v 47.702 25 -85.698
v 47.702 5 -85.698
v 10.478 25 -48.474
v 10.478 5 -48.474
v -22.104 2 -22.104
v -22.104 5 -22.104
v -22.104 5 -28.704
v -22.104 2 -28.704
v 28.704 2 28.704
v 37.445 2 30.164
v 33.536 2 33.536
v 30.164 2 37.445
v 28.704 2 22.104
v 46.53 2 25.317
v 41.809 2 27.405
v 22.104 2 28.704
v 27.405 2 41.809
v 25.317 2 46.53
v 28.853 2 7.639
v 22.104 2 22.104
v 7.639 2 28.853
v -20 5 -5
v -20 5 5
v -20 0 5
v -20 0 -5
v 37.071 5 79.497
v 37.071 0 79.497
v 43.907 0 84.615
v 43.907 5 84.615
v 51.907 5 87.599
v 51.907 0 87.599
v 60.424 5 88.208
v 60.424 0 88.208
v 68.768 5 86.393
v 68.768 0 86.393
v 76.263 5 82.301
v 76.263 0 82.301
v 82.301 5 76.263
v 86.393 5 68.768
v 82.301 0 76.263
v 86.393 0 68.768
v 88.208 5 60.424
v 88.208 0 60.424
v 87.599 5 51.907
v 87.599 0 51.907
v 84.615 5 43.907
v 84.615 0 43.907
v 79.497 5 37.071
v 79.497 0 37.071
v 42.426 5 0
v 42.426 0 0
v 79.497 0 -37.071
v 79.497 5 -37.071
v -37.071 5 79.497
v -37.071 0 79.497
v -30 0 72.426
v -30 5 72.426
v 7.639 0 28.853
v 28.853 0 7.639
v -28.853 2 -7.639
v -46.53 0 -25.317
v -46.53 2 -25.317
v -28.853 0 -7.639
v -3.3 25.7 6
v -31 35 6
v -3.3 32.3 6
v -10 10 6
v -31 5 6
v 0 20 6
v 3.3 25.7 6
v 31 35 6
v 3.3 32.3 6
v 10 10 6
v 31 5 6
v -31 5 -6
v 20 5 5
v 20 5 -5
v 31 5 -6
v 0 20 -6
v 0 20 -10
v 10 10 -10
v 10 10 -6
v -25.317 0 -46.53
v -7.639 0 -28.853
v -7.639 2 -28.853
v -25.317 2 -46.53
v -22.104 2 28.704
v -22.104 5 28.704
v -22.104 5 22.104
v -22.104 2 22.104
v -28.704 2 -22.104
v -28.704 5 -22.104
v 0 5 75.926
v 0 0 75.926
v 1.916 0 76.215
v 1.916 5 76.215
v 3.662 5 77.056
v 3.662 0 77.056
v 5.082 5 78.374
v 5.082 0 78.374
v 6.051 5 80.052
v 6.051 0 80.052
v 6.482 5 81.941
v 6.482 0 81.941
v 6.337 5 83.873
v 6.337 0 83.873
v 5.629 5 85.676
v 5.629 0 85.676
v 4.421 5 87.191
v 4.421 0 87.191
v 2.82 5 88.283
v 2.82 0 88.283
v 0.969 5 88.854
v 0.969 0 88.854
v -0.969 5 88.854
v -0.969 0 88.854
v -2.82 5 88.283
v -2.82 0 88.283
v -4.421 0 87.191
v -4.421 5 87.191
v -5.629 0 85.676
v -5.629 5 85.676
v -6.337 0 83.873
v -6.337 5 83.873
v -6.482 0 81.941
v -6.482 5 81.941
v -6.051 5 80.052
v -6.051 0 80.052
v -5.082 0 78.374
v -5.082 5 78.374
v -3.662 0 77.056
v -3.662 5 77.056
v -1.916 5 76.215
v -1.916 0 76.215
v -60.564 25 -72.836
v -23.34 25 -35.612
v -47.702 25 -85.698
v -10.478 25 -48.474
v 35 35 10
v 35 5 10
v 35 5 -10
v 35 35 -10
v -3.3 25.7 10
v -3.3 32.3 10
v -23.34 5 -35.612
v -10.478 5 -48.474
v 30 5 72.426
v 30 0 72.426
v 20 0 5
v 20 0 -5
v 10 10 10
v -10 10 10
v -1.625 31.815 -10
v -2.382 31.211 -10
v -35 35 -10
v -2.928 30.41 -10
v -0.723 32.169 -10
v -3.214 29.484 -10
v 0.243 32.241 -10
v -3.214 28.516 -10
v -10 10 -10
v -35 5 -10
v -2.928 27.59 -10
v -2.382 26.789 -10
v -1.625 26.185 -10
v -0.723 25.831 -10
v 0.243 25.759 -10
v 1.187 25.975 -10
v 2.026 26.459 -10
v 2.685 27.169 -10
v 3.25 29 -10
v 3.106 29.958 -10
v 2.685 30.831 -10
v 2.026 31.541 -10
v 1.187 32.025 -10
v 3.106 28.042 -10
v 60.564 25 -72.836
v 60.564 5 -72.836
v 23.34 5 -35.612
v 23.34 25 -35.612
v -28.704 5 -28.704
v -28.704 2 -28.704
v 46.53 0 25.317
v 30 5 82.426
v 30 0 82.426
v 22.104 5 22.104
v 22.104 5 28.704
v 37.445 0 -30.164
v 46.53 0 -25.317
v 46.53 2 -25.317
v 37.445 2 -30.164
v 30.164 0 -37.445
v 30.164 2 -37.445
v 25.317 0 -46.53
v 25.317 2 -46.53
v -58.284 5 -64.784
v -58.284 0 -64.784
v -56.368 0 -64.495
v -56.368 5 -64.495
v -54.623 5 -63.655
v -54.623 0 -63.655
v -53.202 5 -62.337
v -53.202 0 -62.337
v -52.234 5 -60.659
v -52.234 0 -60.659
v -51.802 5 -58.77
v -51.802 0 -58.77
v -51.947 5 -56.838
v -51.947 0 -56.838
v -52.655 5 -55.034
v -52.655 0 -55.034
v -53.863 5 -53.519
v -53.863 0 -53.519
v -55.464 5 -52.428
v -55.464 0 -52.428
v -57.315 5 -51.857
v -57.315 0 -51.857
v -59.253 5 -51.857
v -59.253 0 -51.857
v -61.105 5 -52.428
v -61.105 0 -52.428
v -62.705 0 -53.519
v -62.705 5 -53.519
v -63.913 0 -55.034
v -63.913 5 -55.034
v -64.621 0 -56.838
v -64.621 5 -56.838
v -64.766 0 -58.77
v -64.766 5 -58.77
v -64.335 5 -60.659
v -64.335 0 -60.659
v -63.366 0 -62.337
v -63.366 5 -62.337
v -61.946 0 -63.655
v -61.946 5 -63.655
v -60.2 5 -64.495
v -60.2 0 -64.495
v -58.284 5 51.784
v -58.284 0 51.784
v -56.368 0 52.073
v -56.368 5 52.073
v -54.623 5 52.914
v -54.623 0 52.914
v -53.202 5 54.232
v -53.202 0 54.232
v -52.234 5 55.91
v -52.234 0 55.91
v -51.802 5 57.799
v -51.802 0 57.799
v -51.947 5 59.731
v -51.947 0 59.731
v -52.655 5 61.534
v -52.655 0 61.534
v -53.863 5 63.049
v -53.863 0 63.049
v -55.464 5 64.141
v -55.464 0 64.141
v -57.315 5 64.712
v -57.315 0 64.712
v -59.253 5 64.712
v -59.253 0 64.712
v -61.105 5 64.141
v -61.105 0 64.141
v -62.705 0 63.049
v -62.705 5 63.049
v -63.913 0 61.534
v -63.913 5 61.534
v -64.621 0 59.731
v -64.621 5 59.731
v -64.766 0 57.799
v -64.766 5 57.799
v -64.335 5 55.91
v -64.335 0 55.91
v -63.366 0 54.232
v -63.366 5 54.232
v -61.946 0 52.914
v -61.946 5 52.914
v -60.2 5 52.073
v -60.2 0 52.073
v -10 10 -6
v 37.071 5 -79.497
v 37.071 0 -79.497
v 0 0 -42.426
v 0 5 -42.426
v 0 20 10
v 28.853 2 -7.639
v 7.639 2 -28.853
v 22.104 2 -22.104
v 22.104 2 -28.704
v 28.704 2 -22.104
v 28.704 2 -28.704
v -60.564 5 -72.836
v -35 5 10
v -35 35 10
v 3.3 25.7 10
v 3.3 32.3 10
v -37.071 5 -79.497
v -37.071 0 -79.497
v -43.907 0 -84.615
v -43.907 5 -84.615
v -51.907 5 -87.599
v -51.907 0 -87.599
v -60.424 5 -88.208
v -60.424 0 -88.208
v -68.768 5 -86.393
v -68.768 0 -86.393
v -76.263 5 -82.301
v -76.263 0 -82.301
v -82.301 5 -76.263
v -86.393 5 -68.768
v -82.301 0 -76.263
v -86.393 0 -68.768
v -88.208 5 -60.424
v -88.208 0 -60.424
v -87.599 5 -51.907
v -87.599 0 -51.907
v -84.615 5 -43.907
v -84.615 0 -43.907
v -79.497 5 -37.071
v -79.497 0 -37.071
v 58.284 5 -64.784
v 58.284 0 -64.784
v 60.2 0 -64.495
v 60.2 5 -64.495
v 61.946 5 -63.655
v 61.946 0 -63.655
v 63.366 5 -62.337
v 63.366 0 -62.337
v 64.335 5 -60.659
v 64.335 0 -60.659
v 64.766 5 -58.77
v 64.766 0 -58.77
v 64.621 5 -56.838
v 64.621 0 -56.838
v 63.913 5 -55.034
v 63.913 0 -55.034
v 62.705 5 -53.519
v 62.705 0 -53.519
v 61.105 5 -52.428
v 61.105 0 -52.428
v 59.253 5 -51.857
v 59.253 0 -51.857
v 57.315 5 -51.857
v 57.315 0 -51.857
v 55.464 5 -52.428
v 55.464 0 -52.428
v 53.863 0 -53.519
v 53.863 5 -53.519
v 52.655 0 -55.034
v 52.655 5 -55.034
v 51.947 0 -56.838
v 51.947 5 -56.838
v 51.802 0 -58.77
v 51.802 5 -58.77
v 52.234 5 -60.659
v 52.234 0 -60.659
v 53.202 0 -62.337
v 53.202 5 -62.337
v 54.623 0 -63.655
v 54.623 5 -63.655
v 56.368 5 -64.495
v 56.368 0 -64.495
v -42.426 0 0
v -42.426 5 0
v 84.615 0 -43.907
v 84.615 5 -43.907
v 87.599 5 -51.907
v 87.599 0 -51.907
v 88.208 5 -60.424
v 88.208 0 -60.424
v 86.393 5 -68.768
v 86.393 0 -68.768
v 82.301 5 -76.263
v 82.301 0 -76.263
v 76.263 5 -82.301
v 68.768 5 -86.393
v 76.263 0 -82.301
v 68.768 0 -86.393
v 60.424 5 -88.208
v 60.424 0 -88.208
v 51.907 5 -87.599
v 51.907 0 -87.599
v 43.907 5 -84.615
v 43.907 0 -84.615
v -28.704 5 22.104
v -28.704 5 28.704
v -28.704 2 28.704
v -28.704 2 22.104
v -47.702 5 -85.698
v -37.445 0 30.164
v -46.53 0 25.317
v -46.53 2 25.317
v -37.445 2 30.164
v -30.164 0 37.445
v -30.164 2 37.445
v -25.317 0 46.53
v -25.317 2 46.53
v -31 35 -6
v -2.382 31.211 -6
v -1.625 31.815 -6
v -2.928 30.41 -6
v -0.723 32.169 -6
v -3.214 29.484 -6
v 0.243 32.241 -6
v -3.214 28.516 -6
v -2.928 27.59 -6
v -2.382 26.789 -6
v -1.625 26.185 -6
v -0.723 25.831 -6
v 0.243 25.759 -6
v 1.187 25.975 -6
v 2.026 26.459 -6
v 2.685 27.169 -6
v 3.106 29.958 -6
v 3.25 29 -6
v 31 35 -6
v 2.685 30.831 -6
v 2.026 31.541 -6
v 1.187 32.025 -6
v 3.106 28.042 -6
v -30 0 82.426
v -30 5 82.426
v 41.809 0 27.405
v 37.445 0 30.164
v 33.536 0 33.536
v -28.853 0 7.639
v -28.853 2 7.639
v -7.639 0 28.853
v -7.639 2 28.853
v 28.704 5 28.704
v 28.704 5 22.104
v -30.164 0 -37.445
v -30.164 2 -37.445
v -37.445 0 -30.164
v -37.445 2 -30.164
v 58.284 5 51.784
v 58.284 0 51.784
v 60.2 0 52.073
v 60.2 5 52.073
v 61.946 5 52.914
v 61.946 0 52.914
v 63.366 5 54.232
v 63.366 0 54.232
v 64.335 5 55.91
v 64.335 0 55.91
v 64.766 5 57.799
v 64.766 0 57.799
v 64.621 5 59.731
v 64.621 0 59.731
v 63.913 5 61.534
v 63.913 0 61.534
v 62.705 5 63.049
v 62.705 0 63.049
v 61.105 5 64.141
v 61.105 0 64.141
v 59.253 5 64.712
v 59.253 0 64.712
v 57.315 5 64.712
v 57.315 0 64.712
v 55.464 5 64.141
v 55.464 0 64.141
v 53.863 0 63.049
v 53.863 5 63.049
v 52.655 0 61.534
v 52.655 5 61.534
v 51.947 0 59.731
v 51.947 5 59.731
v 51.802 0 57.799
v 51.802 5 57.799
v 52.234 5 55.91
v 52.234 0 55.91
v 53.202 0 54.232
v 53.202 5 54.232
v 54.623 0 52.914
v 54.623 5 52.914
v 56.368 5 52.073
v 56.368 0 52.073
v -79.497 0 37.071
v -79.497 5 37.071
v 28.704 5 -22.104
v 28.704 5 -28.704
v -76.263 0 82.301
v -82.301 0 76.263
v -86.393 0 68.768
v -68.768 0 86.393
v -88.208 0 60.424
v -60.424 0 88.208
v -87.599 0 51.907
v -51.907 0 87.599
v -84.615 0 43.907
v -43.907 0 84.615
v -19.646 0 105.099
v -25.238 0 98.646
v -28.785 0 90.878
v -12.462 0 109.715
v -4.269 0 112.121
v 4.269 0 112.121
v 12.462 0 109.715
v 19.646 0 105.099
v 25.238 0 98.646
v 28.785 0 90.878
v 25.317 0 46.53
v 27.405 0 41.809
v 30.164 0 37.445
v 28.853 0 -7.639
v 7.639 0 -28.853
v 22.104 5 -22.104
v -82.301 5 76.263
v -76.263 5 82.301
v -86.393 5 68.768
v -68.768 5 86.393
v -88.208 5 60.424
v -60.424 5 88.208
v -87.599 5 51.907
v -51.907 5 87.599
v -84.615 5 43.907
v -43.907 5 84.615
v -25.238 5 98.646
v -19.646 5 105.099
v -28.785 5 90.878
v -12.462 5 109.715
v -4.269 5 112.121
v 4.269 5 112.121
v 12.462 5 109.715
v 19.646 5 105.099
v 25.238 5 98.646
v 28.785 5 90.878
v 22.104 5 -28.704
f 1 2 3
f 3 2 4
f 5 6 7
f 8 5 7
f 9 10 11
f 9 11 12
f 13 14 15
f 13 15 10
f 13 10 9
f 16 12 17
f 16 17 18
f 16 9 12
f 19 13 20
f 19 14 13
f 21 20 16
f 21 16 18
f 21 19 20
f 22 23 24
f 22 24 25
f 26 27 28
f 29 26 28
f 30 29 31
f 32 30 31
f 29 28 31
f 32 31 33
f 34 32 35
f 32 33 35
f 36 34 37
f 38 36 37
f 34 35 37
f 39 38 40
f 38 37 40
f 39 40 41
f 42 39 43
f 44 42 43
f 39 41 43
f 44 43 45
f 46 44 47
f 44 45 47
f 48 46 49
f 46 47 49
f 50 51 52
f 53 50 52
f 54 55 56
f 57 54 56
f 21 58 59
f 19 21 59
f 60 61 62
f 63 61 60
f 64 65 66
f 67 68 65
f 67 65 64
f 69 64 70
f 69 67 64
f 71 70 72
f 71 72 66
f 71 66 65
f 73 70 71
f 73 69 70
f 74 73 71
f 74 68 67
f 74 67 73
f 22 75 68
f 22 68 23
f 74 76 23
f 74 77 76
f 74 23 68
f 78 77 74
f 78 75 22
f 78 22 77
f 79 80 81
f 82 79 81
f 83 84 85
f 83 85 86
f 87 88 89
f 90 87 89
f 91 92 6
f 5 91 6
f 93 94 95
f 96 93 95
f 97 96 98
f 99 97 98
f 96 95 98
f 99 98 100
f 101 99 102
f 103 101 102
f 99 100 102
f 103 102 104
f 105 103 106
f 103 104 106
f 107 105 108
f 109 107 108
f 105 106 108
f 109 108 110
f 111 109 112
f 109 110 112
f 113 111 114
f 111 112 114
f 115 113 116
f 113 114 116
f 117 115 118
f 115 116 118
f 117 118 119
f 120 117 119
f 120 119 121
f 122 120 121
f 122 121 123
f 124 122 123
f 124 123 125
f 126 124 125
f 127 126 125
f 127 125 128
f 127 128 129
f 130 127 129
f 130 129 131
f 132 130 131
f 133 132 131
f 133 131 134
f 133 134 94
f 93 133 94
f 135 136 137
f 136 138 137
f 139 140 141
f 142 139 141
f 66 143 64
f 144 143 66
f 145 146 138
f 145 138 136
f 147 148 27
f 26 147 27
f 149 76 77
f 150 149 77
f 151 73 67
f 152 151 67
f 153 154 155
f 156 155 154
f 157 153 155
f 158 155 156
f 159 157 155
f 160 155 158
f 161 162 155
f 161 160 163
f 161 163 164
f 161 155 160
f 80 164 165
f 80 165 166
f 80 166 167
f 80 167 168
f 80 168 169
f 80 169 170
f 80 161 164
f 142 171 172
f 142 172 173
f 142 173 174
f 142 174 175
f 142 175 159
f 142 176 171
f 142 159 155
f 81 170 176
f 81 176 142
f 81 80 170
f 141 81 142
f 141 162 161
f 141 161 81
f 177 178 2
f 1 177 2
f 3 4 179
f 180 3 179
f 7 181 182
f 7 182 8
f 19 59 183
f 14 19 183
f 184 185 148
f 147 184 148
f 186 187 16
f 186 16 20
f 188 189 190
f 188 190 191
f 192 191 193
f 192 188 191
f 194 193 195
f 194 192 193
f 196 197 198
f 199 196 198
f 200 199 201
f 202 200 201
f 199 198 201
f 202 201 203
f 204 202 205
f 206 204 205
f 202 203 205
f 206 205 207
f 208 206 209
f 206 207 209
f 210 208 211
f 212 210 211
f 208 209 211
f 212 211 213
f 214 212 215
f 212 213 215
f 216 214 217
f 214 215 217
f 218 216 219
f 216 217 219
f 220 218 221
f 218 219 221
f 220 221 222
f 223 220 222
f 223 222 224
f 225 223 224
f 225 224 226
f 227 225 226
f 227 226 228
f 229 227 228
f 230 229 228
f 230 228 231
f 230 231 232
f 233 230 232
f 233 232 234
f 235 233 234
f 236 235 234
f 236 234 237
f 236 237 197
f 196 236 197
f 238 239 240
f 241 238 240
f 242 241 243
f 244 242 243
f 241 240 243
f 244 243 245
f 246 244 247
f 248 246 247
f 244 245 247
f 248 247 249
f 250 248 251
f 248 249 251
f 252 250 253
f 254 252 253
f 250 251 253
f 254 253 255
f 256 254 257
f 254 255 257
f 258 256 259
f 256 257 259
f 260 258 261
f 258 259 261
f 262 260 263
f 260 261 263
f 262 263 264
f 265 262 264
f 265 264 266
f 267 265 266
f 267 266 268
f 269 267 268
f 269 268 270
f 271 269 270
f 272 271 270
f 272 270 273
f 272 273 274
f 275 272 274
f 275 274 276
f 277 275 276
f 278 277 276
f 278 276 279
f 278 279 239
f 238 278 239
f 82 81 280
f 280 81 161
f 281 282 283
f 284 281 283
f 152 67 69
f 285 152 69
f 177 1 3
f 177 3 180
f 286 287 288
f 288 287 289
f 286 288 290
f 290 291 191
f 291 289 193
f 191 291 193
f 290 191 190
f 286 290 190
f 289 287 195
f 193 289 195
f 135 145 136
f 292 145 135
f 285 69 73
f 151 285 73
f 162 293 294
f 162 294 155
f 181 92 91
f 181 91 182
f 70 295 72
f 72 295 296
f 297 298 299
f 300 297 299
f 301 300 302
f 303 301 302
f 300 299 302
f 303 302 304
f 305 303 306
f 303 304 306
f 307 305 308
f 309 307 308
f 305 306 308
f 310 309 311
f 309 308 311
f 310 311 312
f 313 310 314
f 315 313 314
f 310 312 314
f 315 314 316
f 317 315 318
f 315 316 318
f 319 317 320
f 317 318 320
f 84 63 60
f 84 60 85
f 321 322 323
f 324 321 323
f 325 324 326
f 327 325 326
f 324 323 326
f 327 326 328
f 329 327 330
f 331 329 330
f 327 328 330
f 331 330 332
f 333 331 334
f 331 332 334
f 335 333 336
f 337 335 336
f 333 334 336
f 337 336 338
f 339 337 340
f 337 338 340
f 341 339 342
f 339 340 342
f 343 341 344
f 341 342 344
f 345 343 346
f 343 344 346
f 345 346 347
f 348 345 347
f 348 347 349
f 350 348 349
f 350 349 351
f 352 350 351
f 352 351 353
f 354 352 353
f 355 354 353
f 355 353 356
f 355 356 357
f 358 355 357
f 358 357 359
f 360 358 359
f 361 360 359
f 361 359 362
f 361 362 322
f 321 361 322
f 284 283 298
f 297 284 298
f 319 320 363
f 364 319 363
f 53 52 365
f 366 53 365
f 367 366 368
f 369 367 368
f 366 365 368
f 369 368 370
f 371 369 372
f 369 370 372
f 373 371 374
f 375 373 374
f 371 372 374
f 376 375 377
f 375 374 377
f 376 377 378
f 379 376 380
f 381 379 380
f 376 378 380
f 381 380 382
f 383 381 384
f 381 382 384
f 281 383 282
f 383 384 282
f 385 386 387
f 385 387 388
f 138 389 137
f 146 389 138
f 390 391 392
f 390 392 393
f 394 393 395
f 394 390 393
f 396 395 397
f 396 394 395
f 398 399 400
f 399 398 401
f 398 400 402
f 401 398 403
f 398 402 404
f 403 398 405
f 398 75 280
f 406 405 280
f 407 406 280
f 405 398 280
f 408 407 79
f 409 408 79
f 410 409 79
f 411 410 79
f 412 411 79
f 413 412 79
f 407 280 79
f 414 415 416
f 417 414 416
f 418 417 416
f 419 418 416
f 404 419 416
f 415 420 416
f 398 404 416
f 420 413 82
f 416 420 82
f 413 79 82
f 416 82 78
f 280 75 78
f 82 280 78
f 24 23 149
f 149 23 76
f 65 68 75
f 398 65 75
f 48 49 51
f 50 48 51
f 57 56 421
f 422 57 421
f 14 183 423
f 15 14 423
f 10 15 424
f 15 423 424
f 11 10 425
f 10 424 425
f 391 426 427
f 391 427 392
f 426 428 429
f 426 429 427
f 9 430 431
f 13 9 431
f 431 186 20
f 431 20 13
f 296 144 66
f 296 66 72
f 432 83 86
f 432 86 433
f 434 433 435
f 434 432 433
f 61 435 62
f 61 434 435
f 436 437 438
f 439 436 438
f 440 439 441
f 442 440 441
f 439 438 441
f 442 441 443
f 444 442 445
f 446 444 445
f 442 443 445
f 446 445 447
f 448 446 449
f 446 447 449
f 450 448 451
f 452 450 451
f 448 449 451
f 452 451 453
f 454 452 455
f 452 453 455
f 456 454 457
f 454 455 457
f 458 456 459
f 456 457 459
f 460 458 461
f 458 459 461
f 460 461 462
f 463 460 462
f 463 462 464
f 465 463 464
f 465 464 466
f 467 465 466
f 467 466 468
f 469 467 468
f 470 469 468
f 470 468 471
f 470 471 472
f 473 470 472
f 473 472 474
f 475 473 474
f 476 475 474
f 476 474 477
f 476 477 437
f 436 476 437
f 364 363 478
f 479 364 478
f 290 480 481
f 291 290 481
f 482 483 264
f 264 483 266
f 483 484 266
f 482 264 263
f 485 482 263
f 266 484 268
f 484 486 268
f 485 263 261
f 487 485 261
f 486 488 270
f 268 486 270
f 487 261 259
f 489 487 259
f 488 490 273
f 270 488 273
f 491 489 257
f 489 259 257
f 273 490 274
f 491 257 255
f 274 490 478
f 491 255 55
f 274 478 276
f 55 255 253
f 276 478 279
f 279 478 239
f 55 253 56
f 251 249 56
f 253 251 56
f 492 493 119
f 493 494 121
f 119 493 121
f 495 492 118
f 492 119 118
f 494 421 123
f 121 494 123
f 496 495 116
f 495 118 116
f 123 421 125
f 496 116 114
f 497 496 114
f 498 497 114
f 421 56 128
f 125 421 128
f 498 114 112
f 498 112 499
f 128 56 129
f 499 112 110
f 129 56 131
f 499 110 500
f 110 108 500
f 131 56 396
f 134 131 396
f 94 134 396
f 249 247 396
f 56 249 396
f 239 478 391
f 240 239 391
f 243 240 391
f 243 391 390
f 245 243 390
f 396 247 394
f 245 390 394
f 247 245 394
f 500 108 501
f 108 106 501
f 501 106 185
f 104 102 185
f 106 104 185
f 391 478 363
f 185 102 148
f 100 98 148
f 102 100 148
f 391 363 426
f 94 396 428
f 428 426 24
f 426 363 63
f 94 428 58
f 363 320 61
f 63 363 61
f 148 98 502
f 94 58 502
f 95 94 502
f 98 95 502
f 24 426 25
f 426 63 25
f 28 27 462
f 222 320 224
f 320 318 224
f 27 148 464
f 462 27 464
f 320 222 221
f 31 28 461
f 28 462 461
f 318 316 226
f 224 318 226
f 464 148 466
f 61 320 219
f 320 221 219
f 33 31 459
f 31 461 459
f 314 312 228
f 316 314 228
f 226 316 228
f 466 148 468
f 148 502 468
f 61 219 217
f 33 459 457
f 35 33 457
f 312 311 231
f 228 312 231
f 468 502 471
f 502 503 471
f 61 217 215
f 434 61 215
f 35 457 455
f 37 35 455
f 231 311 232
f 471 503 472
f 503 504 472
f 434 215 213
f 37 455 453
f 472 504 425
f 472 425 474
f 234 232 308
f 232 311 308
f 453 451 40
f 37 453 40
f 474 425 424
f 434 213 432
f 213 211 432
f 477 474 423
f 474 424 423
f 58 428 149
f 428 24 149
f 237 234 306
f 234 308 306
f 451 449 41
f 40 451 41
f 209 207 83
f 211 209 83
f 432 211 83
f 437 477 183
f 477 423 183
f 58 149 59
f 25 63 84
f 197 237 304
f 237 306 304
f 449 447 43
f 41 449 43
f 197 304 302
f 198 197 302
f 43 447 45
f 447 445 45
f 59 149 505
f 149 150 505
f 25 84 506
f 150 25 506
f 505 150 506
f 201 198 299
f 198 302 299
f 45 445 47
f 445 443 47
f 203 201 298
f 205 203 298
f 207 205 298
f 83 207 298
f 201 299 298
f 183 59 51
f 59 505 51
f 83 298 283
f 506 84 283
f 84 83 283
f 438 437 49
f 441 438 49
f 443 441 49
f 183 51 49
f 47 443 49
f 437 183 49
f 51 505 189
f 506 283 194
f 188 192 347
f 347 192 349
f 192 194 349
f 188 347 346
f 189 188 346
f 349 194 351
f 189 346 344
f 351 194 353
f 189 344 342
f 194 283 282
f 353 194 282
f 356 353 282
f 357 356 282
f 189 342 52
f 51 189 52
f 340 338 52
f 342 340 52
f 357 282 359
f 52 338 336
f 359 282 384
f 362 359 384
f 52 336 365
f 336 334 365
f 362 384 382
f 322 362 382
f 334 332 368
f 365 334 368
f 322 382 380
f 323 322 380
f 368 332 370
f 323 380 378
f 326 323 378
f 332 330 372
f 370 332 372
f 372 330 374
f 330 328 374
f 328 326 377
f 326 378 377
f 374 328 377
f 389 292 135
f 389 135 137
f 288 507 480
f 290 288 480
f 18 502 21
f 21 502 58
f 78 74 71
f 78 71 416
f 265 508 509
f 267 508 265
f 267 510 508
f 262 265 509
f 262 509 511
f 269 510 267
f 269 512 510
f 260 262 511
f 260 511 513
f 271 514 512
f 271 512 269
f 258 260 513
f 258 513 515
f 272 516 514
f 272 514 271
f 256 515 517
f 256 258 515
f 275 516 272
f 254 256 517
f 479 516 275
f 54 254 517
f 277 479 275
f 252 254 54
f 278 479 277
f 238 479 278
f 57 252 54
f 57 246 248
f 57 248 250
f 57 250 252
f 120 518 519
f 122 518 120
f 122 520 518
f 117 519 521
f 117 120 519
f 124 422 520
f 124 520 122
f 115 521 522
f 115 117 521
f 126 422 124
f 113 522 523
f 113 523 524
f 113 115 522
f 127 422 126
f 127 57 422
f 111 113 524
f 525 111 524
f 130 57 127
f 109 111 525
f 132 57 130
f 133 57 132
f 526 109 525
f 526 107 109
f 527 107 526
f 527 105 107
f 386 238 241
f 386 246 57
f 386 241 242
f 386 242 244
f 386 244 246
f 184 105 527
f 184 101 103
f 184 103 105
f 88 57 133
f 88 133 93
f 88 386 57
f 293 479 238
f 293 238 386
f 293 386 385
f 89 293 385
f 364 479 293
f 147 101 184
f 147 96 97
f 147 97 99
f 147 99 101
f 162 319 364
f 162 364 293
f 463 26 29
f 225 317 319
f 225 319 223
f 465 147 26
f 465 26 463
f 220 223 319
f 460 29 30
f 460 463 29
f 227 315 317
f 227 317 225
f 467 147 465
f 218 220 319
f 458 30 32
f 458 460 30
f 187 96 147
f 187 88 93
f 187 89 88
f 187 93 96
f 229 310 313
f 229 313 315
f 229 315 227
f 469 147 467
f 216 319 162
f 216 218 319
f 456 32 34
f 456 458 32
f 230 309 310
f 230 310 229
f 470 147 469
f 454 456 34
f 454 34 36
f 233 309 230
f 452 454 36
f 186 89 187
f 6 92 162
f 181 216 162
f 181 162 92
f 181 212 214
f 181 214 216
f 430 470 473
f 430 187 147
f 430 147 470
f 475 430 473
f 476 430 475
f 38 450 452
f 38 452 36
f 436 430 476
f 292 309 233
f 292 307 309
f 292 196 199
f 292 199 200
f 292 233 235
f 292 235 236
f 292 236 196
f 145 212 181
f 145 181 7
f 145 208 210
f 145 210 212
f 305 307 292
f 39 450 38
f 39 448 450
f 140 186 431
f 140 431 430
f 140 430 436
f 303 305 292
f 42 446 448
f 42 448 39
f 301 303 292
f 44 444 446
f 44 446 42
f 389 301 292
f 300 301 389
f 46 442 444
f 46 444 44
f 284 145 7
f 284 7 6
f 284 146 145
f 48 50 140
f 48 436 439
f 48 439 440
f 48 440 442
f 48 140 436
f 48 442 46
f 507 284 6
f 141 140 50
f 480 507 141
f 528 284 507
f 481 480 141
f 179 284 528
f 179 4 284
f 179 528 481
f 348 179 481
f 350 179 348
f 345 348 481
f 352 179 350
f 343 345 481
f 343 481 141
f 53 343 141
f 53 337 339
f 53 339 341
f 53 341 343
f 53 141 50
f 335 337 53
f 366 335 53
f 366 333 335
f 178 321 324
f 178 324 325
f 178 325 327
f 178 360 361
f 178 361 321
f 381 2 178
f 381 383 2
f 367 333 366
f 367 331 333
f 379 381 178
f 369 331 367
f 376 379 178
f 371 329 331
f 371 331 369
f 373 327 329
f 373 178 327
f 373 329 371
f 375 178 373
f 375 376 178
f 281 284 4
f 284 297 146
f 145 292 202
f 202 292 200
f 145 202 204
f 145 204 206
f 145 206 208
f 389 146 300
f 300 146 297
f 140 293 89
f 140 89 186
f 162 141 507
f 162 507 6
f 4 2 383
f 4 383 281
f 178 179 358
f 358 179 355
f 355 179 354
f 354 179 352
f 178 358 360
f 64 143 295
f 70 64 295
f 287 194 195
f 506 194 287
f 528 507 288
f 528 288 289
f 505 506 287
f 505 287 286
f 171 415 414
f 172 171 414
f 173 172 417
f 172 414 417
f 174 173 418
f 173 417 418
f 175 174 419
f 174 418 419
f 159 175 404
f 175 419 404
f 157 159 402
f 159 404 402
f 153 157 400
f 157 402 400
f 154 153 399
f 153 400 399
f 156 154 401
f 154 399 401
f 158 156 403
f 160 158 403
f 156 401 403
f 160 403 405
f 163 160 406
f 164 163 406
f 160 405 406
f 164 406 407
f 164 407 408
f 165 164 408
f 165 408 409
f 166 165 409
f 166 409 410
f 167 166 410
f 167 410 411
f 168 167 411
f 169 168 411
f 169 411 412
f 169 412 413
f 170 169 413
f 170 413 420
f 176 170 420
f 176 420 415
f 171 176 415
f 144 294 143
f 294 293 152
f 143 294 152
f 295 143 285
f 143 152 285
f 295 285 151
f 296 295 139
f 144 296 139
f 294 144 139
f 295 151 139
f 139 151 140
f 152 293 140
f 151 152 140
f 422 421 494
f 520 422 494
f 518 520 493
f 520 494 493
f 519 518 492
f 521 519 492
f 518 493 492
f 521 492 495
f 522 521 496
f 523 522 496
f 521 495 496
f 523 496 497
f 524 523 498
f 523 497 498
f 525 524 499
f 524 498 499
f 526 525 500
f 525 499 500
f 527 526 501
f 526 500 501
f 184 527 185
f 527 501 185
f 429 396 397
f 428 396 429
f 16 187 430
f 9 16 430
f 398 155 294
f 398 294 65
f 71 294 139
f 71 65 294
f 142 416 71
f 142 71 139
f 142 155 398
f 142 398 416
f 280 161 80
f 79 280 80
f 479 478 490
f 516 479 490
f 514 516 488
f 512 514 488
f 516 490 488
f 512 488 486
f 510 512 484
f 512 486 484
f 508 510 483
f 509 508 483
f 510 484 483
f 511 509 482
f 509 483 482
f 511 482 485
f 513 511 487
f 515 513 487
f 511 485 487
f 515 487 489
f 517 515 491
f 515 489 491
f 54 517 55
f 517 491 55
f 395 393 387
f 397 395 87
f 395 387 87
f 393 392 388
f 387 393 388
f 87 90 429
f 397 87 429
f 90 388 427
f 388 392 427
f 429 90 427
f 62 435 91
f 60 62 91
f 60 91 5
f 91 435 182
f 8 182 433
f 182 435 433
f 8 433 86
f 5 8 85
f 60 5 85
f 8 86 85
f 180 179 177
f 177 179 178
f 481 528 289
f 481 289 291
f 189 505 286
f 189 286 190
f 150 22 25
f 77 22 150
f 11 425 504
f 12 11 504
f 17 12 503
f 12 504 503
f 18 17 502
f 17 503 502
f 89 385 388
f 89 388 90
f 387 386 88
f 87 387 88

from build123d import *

# Parameters (mm, degrees)
BOSS_EXTRU_1_DEPTH      = 5
ENL_V_MAT_EXTRU_1_DEPTH = 2
ESQUISSE7_R             = 6.5
ENL_V_MAT_EXTRU_3_DEPTH = 144.034294879
ESQUISSE10_R            = 3.175
ENL_V_MAT_EXTRU_4_DEPTH = 144.034294879
ESQUISSE11_W            = 6.6
ESQUISSE11_H            = 6.6
ENL_V_MAT_EXTRU_5_DEPTH = 3.5
BOSS_EXTRU_8_DEPTH      = 20
ESQUISSE18_W            = 70
ESQUISSE18_H            = 20
ESQUISSE18_W_2          = 62
ESQUISSE18_H_2          = 12
BOSS_EXTRU_9_DEPTH      = 30
ESQUISSE19_R            = 3.25
ENL_V_MAT_EXTRU_6_DEPTH = 140.679208812
ESQUISSE20_W            = 6.6
ESQUISSE20_H            = 6.6
ENL_V_MAT_EXTRU_7_DEPTH = 4
ESQUISSE21_W            = 40
ESQUISSE21_H            = 10
ENL_V_MAT_EXTRU_8_DEPTH = 147.060978744
ENL_V_MAT_EXTRU_9_DEPTH = 155.943014199


with BuildPart() as part:
    # Esquisse2 → Boss.-Extru.1 (new body)
    with BuildSketch(Plane(origin=(0, 0, 0), x_dir=(1, 0, 0), z_dir=(0, 1, 0))):
        with BuildLine():
            Line((79.497474683, -37.071067812), (42.426406871, 0))
            Line((42.426406871, 0), (79.497474683, 37.071067812))
            ThreePointArc((79.497474683, 37.071067812), (79.497474683, 79.497474683), (37.071067812, 79.497474683))
            Line((37.071067812, 79.497474683), (0, 42.426406871))
            Line((0, 42.426406871), (-37.071067812, 79.497474683))
            ThreePointArc((-37.071067812, 79.497474683), (-79.497474683, 79.497474683), (-79.497474683, 37.071067812))
            Line((-79.497474683, 37.071067812), (-42.426406871, 0))
            Line((-42.426406871, 0), (-79.497474683, -37.071067812))
            ThreePointArc((-79.497474683, -37.071067812), (-79.497474683, -79.497474683), (-37.071067812, -79.497474683))
            Line((-37.071067812, -79.497474683), (-30, -72.426406871))
            Line((-30, -72.426406871), (-30, -82.426406871))
            ThreePointArc((-30, -82.426406871), (0, -112.426406871), (30, -82.426406871))
            Line((30, -82.426406871), (30, -72.426406871))
            Line((30, -72.426406871), (37.071067812, -79.497474683))
            ThreePointArc((37.071067812, -79.497474683), (79.497474683, -79.497474683), (79.497474683, -37.071067812))
        make_face()
    extrude(amount=BOSS_EXTRU_1_DEPTH)

    # Esquisse4 → Enlèv. mat.-Extru.1 (cut)
    with BuildSketch(Plane(origin=(0, 0, 0), x_dir=(-1, 0, 0), z_dir=(0, -1, 0))):
        with BuildLine():
            Line((-33.535533906, -33.535533906), (-18.245921943, -18.245921943))
            Line((-18.245921943, -18.245921943), (-28.852523661, -7.639320225))
            Line((-28.852523661, -7.639320225), (-46.53019319, -25.316989755))
            ThreePointArc((-46.53019319, -25.316989755), (-39.575984314, -28.703872332), (-33.535533906, -33.535533906))
        make_face()
        with BuildLine():
            Line((-7.639320225, -28.852523661), (-18.245921943, -18.245921943))
            Line((-18.245921943, -18.245921943), (-33.535533906, -33.535533906))
            ThreePointArc((-33.535533906, -33.535533906), (-28.703872332, -39.575984314), (-25.316989755, -46.53019319))
            Line((-25.316989755, -46.53019319), (-7.639320225, -28.852523661))
        make_face()
        with BuildLine():
            ThreePointArc((-46.53019319, 25.316989755), (-33.535533906, 33.535533906), (-25.316989755, 46.53019319))
            Line((-25.316989755, 46.53019319), (-7.639320225, 28.852523661))
            Line((-7.639320225, 28.852523661), (-28.852523661, 7.639320225))
            Line((-28.852523661, 7.639320225), (-46.53019319, 25.316989755))
        make_face()
        with BuildLine():
            ThreePointArc((25.316989755, 46.53019319), (33.535533906, 33.535533906), (46.53019319, 25.316989755))
            Line((46.53019319, 25.316989755), (28.852523661, 7.639320225))
            Line((28.852523661, 7.639320225), (7.639320225, 28.852523661))
            Line((7.639320225, 28.852523661), (25.316989755, 46.53019319))
        make_face()
        with BuildLine():
            ThreePointArc((46.53019319, -25.316989755), (33.535533906, -33.535533906), (25.316989755, -46.53019319))
            Line((25.316989755, -46.53019319), (7.639320225, -28.852523661))
            Line((7.639320225, -28.852523661), (28.852523661, -7.639320225))
            Line((28.852523661, -7.639320225), (46.53019319, -25.316989755))
        make_face()
    extrude(amount=-ENL_V_MAT_EXTRU_1_DEPTH, mode=Mode.SUBTRACT)

    # Esquisse7 → Enlèv. mat.-Extru.3 (cut, through all)
    with BuildSketch(Plane(origin=(0, 0, 0), x_dir=(-1, 0, 0), z_dir=(0, -1, 0))):
        with Locations(Location((0, -82.426406871, 0), (0, 0, 90))):
            Circle(ESQUISSE7_R)
        with Locations(Location((-58.284271247, -58.284271247, 0), (0, 0, 90))):
            Circle(ESQUISSE7_R)
        with Locations(Location((-58.284271247, 58.284271247, 0), (0, 0, 90))):
            Circle(ESQUISSE7_R)
        with Locations(Location((58.284271247, 58.284271247, 0), (0, 0, 90))):
            Circle(ESQUISSE7_R)
        with Locations(Location((58.284271247, -58.284271247, 0), (0, 0, 90))):
            Circle(ESQUISSE7_R)
    extrude(amount=-ENL_V_MAT_EXTRU_3_DEPTH, mode=Mode.SUBTRACT)

    # Esquisse10 → Enlèv. mat.-Extru.4 (cut, through all)
    with BuildSketch(Plane(origin=(0, 5, 0), x_dir=(1, 0, 0), z_dir=(0, 1, 0))):
        with Locations(Location((25.403805922, -25.403805922, 0), (0, 0, 270))):
            Circle(ESQUISSE10_R)
        with Locations(Location((-25.403805922, -25.403805922, 0), (0, 0, 270))):
            Circle(ESQUISSE10_R)
        with Locations(Location((-25.403805922, 25.403805922, 0), (0, 0, 270))):
            Circle(ESQUISSE10_R)
        with Locations(Location((25.403805922, 25.403805922, 0), (0, 0, 270))):
            Circle(ESQUISSE10_R)
    extrude(amount=-ENL_V_MAT_EXTRU_4_DEPTH, mode=Mode.SUBTRACT)

    # Esquisse11 → Enlèv. mat.-Extru.5 (cut)
    with BuildSketch(Plane(origin=(0, 5, 0), x_dir=(1, 0, 0), z_dir=(0, 1, 0))):
        with Locations((-25.403805922, -25.403805922)):
            Rectangle(ESQUISSE11_W, ESQUISSE11_H)
        with Locations((25.403805922, -25.403805922)):
            Rectangle(ESQUISSE11_W, ESQUISSE11_H)
        with Locations((-25.403805922, 25.403805922)):
            Rectangle(ESQUISSE11_W, ESQUISSE11_H)
        with Locations((25.403805922, 25.403805922)):
            Rectangle(ESQUISSE11_W, ESQUISSE11_H)
    extrude(amount=-ENL_V_MAT_EXTRU_5_DEPTH, mode=Mode.SUBTRACT)

    # Esquisse16 → Boss.-Extru.8 (add)
    with BuildSketch(Plane(origin=(0, 5, 0), x_dir=(1, 0, 0), z_dir=(0, 1, 0))):
        Polygon((47.702116935, 85.698237446), (10.478031818, 48.474152329), (23.340408221, 35.611775926), (60.564493338, 72.835861043), align=None)
        Polygon((-23.340408221, 35.611775926), (-60.564493338, 72.835861043), (-47.702116935, 85.698237446), (-10.478031818, 48.474152329), align=None)
    extrude(amount=BOSS_EXTRU_8_DEPTH)

    # Esquisse18 → Boss.-Extru.9 (add)
    with BuildSketch(Plane(origin=(0, 5, 0), x_dir=(1, 0, 0), z_dir=(0, 1, 0))):
        Rectangle(ESQUISSE18_W, ESQUISSE18_H)
        Rectangle(ESQUISSE18_W_2, ESQUISSE18_H_2, mode=Mode.SUBTRACT)
    extrude(amount=BOSS_EXTRU_9_DEPTH)

    # Esquisse19 → Enlèv. mat.-Extru.6 (cut, through all)
    with BuildSketch(Plane.XY.offset(10)):
        with Locations((0, 29)):
            Circle(ESQUISSE19_R)
    extrude(amount=-ENL_V_MAT_EXTRU_6_DEPTH, mode=Mode.SUBTRACT)

    # Esquisse20 → Enlèv. mat.-Extru.7 (cut)
    with BuildSketch(Plane.XY.offset(10)):
        with Locations((0, 29)):
            Rectangle(ESQUISSE20_W, ESQUISSE20_H)
    extrude(amount=-ENL_V_MAT_EXTRU_7_DEPTH, mode=Mode.SUBTRACT)

    # Esquisse21 → Enlèv. mat.-Extru.8 (cut, through all)
    with BuildSketch(Plane(origin=(0, 5, 0), x_dir=(1, 0, 0), z_dir=(0, 1, 0))):
        Rectangle(ESQUISSE21_W, ESQUISSE21_H)
    extrude(amount=-ENL_V_MAT_EXTRU_8_DEPTH, mode=Mode.SUBTRACT)

    # Esquisse22 → Enlèv. mat.-Extru.9 (cut, through all)
    with BuildSketch(Plane(origin=(0, 0, -10), x_dir=(-1, 0, 0), z_dir=(0, 0, -1))):
        Polygon((-10, 10), (10, 10), (0, 20), align=None)
    extrude(amount=-ENL_V_MAT_EXTRU_9_DEPTH, mode=Mode.SUBTRACT)


solid = part.part
